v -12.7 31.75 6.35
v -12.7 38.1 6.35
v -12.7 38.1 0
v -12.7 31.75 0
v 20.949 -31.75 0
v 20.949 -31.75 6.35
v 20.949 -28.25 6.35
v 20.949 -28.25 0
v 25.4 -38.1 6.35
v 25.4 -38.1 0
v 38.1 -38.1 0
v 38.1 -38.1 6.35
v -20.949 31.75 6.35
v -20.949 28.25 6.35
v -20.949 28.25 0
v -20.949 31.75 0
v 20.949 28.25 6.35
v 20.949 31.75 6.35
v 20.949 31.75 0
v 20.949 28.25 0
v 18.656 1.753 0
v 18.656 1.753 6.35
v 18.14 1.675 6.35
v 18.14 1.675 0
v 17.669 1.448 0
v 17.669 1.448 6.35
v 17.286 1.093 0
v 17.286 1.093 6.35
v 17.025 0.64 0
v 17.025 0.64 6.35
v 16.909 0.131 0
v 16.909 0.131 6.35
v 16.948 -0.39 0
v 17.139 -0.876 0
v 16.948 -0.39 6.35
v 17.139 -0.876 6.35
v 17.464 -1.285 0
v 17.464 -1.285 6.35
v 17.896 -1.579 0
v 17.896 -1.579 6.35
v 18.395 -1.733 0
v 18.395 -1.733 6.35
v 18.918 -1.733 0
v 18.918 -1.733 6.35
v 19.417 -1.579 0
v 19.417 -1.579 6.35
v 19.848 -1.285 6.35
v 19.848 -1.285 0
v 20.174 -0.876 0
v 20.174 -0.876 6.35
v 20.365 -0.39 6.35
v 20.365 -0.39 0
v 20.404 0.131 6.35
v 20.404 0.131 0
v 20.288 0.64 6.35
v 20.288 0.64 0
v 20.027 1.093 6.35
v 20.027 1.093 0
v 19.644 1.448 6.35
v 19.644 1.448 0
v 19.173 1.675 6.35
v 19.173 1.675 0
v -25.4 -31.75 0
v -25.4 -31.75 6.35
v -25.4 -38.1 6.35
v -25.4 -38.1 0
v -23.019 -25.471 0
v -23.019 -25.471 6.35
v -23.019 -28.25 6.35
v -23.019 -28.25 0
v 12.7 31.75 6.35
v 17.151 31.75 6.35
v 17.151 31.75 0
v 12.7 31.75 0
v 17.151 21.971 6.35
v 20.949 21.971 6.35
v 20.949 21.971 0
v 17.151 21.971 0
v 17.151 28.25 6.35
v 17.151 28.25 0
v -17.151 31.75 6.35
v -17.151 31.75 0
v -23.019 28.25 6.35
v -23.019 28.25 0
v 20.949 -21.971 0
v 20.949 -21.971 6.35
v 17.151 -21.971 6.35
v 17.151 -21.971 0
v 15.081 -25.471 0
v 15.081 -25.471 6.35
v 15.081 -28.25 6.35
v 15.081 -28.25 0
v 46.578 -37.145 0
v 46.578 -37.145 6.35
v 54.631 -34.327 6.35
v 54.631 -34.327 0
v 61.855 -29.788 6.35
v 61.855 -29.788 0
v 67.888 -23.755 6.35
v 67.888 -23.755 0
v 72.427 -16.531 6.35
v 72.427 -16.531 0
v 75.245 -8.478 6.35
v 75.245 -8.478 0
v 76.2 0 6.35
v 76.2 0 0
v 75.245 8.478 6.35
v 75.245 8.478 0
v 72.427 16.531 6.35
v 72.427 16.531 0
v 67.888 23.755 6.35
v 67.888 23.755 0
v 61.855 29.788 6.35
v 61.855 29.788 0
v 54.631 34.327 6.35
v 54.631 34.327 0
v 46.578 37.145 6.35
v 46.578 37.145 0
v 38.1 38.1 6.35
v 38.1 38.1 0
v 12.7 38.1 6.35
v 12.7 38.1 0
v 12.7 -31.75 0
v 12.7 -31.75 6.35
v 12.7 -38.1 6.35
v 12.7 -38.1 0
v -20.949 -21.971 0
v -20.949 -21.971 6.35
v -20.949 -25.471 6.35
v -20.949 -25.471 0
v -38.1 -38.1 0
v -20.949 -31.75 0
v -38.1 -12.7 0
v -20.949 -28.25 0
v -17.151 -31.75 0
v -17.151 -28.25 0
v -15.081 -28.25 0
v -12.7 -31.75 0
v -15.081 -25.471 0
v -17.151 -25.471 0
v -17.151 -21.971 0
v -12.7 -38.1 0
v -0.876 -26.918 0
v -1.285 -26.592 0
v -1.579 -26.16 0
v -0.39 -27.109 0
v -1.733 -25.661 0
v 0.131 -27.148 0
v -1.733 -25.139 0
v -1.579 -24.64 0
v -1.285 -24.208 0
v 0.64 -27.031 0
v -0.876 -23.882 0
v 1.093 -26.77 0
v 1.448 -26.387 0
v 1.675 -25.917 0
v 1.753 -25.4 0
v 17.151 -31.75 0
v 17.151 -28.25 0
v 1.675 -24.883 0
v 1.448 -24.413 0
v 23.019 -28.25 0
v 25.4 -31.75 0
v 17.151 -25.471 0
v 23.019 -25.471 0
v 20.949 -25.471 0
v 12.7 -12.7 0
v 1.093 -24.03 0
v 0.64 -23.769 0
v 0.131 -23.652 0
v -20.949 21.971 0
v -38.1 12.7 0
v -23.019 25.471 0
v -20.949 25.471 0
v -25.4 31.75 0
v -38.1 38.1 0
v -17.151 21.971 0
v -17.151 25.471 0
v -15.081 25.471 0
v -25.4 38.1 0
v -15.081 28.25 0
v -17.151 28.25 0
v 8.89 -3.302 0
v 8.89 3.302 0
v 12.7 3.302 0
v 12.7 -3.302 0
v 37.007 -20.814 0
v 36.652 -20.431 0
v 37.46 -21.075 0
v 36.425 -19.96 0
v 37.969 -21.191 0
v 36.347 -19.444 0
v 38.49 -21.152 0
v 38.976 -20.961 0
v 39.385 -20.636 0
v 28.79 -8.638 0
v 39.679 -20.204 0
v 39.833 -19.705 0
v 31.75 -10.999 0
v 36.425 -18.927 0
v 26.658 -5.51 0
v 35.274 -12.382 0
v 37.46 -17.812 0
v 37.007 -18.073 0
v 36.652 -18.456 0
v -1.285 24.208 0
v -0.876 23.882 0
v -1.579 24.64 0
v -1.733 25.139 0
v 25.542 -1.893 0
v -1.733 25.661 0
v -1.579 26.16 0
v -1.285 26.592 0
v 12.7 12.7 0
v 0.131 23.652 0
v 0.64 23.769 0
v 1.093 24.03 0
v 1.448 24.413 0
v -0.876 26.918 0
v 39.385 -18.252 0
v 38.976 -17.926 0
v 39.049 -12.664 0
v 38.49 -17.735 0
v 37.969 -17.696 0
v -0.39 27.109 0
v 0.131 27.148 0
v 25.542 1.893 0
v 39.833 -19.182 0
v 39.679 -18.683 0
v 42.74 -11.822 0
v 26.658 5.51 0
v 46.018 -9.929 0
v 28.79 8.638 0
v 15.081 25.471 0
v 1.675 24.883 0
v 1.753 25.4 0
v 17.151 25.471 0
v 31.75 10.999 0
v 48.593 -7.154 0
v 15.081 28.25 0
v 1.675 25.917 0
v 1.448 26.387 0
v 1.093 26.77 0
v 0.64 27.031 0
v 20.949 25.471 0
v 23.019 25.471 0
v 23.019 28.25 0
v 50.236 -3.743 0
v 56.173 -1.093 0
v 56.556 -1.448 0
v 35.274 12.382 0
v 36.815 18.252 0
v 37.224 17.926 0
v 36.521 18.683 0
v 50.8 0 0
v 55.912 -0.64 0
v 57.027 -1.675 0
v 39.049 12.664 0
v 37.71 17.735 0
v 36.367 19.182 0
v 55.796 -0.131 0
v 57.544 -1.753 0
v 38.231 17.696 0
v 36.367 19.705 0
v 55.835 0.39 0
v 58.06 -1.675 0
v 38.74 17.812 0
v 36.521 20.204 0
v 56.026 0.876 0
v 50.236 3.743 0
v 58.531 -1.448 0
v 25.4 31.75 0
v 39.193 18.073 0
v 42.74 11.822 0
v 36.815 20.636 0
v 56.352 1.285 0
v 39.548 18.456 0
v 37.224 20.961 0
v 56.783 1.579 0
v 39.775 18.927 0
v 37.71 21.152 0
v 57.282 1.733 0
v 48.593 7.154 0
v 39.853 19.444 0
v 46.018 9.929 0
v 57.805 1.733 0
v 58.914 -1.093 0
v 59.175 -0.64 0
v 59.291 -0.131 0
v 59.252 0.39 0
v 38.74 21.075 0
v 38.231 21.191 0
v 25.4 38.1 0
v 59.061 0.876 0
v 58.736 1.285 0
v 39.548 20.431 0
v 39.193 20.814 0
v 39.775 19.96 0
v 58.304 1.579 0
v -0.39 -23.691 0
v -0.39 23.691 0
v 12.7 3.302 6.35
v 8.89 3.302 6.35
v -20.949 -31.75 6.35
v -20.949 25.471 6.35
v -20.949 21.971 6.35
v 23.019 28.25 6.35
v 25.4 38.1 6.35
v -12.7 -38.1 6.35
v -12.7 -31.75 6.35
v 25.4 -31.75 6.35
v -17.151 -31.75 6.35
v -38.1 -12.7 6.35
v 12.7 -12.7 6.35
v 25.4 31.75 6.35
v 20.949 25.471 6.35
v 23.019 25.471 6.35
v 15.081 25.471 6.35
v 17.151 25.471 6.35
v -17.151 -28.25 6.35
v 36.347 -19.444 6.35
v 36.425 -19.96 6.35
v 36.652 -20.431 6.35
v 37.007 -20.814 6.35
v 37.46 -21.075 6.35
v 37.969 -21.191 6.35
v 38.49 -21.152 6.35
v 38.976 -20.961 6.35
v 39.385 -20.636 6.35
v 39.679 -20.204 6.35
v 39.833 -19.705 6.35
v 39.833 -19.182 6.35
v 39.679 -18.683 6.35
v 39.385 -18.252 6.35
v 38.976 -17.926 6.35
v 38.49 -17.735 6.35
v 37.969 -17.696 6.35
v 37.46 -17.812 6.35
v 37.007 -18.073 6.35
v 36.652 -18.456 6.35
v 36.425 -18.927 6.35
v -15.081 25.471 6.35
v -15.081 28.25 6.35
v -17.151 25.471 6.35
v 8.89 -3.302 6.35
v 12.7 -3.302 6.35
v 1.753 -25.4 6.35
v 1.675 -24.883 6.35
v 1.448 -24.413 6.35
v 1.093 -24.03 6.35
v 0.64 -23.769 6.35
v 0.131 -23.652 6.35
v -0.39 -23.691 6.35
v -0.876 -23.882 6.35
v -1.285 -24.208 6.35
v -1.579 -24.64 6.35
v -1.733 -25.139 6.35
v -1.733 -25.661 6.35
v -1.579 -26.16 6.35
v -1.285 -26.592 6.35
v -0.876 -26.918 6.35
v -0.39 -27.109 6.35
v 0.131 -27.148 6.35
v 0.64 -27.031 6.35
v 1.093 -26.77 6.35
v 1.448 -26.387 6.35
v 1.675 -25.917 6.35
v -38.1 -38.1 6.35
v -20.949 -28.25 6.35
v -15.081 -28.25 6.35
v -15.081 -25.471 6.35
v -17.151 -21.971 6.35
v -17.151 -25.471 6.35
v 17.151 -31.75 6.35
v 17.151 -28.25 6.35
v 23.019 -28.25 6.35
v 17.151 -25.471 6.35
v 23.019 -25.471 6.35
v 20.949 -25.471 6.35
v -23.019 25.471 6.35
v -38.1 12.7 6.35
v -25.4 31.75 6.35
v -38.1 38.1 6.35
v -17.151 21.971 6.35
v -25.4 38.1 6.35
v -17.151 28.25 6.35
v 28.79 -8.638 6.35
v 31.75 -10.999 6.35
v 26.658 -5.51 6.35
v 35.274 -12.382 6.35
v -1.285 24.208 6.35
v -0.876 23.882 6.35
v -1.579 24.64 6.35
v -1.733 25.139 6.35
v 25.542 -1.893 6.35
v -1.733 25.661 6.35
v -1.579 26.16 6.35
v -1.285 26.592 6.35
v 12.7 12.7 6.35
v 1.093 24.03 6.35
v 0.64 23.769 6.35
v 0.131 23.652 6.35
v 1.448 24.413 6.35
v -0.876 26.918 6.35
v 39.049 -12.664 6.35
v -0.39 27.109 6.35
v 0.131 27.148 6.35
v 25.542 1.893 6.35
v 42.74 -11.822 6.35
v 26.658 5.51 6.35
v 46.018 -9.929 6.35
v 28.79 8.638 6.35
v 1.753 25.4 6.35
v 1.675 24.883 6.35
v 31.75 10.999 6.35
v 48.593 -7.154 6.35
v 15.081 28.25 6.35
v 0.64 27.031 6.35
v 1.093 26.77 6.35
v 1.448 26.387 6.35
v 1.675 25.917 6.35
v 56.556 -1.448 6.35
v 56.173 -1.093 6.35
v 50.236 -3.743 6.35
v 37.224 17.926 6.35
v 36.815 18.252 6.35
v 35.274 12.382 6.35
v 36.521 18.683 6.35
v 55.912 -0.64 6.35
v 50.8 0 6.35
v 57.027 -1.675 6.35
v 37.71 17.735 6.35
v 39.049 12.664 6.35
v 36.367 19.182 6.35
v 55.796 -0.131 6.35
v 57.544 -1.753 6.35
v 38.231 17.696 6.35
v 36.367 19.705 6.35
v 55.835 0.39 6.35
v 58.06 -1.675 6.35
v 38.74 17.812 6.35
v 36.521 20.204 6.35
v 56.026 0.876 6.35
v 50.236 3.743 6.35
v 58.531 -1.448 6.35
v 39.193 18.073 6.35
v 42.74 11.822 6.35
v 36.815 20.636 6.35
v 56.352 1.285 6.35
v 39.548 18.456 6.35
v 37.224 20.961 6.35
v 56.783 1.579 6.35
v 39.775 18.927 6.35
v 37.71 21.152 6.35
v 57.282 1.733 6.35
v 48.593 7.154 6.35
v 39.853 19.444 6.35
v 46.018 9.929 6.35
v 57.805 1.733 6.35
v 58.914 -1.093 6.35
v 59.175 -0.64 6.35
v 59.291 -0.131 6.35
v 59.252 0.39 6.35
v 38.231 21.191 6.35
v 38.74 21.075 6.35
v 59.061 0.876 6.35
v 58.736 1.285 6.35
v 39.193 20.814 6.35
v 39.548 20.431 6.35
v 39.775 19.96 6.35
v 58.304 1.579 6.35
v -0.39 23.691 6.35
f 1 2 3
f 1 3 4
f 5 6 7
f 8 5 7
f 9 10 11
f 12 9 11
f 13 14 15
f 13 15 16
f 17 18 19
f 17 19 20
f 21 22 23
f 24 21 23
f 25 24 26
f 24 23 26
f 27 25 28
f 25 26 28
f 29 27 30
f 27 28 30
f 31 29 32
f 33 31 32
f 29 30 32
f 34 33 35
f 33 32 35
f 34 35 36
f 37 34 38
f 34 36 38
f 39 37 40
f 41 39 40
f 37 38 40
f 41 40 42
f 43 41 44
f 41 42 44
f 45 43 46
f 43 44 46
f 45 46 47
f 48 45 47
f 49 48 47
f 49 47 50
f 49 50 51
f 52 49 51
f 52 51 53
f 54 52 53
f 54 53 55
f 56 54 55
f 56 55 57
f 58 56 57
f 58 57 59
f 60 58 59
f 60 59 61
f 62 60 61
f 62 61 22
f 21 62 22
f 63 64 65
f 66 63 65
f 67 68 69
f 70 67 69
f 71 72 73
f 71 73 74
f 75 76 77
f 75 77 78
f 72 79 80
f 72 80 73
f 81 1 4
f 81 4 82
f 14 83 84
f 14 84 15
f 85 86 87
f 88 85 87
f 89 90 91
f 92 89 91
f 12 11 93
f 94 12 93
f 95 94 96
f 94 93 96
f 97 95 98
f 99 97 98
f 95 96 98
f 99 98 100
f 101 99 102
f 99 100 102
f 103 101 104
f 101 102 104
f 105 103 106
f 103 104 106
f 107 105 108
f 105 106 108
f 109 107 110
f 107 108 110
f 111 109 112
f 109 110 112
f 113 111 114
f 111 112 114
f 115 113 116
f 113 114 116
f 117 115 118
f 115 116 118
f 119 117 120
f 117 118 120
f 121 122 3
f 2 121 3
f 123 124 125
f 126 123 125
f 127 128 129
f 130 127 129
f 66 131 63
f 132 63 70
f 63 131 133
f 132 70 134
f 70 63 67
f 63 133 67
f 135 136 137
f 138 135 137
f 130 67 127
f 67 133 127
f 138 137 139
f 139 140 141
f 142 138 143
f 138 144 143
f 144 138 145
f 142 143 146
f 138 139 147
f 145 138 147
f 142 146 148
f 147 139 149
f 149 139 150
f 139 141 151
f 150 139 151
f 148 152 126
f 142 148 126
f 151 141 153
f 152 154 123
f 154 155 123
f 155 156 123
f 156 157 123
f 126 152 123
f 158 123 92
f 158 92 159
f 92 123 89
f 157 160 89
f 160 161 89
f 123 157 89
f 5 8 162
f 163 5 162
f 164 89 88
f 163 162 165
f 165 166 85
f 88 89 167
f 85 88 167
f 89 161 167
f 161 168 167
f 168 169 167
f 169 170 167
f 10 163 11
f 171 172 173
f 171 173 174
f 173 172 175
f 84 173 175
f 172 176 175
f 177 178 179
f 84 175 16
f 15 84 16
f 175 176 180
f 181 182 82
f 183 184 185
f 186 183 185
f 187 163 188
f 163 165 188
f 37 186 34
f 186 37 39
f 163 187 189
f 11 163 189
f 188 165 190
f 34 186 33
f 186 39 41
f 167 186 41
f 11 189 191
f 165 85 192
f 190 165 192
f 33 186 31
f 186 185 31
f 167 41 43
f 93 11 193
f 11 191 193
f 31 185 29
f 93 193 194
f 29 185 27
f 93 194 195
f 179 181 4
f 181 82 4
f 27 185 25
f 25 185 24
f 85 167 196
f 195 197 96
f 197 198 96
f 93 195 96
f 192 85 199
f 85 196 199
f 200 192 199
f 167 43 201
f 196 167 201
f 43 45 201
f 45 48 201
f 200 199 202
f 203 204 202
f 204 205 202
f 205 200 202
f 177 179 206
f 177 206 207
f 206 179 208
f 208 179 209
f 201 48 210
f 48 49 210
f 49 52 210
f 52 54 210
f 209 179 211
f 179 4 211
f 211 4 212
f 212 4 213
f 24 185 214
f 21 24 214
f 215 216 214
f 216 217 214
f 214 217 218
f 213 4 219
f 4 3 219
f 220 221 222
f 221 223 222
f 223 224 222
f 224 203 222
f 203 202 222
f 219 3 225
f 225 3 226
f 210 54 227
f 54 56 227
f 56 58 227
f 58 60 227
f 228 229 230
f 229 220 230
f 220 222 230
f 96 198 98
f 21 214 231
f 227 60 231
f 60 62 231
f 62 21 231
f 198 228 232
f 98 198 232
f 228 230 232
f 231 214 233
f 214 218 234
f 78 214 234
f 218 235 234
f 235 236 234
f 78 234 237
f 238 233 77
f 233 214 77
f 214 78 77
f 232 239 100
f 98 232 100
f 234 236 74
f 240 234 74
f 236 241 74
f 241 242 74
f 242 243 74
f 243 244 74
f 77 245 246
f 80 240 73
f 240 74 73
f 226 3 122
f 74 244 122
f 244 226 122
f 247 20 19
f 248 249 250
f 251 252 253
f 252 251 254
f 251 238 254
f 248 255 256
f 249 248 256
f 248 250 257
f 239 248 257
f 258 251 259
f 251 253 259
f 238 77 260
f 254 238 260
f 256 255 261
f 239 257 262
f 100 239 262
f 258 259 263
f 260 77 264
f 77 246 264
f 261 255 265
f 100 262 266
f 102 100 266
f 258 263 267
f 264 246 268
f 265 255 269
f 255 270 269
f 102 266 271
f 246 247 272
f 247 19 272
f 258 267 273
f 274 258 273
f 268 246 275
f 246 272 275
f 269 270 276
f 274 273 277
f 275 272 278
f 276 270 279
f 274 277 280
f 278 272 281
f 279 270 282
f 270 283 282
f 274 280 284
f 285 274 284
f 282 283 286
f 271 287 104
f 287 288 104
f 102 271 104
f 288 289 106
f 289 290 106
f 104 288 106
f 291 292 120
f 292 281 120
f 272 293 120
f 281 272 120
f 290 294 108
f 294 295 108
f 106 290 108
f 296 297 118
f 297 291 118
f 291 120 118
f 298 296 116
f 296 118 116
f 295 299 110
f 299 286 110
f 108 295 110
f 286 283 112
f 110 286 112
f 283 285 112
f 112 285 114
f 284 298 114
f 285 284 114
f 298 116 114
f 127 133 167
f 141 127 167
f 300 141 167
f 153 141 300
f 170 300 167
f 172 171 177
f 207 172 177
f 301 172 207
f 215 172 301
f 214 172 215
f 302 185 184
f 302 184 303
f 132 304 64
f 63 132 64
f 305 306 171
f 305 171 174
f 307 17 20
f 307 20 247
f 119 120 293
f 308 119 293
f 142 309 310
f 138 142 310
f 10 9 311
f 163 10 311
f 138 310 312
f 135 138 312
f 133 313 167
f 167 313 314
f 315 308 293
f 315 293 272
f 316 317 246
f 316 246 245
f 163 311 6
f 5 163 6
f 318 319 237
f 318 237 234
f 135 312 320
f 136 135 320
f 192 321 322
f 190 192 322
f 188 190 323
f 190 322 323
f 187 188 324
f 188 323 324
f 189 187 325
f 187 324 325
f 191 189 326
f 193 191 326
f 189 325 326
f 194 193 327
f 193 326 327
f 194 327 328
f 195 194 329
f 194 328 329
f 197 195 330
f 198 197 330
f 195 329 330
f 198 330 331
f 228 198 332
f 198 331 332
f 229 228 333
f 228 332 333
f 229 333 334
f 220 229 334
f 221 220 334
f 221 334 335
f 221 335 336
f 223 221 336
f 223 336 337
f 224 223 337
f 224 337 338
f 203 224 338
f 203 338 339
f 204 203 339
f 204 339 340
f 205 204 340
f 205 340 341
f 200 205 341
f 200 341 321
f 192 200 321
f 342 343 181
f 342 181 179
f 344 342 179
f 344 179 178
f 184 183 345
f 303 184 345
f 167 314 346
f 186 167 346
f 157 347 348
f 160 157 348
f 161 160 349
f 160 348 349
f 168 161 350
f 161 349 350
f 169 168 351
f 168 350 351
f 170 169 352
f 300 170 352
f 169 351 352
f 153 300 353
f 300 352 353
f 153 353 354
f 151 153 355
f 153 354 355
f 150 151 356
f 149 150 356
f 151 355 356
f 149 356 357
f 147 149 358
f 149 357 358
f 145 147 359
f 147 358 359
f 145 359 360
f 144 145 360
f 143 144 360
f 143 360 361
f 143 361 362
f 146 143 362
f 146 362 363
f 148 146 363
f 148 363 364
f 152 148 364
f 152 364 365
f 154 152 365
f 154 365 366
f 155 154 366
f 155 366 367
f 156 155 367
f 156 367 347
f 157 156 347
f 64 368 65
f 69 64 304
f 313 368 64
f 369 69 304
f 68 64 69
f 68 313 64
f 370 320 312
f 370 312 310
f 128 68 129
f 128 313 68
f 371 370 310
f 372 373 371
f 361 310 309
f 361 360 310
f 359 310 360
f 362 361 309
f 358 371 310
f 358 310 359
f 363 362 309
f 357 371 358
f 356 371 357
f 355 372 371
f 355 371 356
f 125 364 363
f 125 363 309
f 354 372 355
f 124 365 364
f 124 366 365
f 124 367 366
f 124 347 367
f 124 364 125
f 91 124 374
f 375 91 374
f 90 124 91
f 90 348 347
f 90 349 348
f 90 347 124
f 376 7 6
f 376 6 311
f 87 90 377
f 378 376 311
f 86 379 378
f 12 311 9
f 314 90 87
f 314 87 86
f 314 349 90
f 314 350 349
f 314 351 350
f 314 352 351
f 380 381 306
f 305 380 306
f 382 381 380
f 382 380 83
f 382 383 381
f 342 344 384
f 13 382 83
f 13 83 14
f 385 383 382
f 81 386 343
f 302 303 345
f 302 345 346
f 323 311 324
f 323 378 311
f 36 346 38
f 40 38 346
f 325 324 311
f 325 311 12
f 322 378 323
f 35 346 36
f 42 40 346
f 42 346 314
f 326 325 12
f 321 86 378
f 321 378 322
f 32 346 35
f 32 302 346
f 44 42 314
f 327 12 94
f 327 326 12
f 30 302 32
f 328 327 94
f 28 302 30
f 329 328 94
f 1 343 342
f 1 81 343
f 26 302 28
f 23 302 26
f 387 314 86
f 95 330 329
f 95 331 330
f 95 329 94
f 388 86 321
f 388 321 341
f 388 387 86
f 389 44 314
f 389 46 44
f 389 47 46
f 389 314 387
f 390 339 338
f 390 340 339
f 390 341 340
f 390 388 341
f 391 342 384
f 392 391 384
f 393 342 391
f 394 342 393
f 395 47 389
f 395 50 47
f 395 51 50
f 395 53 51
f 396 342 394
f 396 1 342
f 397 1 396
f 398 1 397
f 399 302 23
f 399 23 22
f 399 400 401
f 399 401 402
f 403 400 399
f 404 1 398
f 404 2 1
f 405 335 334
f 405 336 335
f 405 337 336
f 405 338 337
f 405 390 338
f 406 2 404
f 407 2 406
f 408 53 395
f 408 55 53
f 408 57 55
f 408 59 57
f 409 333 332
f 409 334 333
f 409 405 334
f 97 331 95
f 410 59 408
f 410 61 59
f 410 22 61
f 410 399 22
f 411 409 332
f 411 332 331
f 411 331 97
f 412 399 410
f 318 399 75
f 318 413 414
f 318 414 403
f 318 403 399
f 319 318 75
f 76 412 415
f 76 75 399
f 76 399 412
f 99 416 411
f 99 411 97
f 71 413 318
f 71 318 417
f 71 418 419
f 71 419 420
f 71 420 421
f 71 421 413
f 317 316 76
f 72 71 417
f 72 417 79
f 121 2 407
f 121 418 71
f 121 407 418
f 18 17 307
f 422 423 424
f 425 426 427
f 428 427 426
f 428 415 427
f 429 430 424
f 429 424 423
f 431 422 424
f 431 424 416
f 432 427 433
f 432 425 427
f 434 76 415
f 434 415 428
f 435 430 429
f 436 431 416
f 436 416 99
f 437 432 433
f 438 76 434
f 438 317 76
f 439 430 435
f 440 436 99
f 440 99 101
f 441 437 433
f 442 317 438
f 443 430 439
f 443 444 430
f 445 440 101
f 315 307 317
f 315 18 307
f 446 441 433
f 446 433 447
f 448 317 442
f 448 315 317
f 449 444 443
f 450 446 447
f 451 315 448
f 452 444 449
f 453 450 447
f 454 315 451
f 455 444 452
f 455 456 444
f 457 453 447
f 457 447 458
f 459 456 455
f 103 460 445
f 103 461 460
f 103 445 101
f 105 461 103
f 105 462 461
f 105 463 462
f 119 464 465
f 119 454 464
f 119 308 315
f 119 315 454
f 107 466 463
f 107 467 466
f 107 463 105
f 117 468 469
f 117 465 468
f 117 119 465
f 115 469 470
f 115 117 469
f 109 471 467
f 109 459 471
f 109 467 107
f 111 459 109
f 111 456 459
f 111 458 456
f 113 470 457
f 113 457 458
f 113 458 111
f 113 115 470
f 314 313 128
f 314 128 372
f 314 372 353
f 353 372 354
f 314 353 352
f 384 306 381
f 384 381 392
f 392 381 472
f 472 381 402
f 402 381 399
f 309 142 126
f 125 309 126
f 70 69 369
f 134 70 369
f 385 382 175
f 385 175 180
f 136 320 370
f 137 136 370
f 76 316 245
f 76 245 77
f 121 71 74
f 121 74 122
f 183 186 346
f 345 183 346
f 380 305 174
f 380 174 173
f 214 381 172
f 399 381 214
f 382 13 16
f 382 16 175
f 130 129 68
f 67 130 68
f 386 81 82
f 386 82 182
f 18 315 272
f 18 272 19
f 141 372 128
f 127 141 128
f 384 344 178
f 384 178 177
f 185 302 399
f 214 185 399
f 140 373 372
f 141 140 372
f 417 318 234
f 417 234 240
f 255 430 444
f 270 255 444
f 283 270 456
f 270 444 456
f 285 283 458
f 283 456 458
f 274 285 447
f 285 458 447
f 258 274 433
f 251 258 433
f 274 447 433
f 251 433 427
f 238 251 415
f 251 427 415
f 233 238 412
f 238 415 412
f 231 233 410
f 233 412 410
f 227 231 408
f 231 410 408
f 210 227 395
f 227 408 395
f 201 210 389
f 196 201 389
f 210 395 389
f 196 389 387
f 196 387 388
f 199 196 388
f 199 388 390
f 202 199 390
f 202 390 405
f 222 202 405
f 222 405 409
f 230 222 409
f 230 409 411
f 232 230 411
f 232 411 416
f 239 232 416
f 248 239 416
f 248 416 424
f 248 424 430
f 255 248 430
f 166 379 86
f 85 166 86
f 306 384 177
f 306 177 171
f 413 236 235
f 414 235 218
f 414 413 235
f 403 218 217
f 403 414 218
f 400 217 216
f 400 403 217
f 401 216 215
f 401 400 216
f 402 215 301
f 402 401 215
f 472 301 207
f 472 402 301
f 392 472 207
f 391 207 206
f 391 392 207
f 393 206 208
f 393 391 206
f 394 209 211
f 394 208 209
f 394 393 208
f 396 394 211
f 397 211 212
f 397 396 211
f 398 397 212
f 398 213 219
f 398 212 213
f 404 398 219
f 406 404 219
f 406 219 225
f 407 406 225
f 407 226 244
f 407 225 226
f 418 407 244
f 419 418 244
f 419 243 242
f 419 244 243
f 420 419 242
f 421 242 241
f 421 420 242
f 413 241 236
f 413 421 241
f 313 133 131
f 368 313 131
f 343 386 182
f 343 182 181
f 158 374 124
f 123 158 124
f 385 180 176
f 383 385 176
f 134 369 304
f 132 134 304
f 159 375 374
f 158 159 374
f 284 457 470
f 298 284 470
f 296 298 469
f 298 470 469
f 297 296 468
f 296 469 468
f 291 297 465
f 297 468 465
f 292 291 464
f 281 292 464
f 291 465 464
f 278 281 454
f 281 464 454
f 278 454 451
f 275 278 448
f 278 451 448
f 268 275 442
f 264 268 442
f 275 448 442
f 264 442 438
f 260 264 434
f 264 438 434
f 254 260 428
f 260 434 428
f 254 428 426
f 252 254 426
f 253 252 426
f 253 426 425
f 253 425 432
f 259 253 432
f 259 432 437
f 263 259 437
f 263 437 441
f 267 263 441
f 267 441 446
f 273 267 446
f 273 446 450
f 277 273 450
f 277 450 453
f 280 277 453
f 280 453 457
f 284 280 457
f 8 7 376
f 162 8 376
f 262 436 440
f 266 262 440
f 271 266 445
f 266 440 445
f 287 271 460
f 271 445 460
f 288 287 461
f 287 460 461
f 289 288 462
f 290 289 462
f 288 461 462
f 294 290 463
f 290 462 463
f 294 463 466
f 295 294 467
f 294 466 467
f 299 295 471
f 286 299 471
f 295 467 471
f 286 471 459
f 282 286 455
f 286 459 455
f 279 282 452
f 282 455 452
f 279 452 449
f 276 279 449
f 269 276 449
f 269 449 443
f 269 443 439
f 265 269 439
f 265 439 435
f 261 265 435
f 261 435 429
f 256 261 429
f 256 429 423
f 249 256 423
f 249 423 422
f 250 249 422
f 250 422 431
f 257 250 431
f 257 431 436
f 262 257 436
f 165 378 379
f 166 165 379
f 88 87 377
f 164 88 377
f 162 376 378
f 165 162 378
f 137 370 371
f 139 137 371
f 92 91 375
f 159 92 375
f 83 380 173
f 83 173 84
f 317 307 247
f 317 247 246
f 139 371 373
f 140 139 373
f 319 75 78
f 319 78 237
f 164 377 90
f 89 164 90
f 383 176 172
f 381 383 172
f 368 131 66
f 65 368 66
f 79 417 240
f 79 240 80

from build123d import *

# Parameters (mm, degrees)
BOSS_EXTRUDE1_DEPTH  = 6.35
SKETCH2_W            = 50.8
SKETCH2_H            = 25.4
CUT_EXTRUDE1_DEPTH   = 86.430512699
CUT_EXTRUDE2_DEPTH   = 6.35
LPATTERN1_COUNT      = 2
LPATTERN1_PITCH      = 38.1
SKETCH4_R            = 1.7526
CUT_EXTRUDE5_DEPTH   = 86.430512699
SKETCH6_W            = 6.35
SKETCH6_H            = 6.604
BOSS_EXTRUDE2_DEPTH  = 3.81
MIRROR4_COPY_1_DEPTH = 6.35
SKETCH5_R            = 12.7
CUT_EXTRUDE4_DEPTH   = 86.430512699
SKETCH7_R            = 1.7526
CUT_EXTRUDE6_DEPTH   = 86.430512699
CIRPATTERN1_COUNT    = 4


with BuildPart() as part:
    # Sketch1 → Boss-Extrude1 (new body)
    with BuildSketch(Plane.XY):
        with BuildLine():
            Line((-38.1, -38.1), (38.1, -38.1))
            ThreePointArc((38.1, -38.1), (76.2, 0), (38.1, 38.1))
            Line((38.1, 38.1), (-38.1, 38.1))
            Line((-38.1, 38.1), (-38.1, -38.1))
        make_face()
    extrude(amount=BOSS_EXTRUDE1_DEPTH)

    # Sketch2 → Cut-Extrude1 (cut, through all)
    with BuildSketch(Plane.XY.offset(6.35)):
        with Locations((-12.7, 0)):
            Rectangle(SKETCH2_W, SKETCH2_H)
    extrude(amount=-CUT_EXTRUDE1_DEPTH, mode=Mode.SUBTRACT)

    # Sketch3 → Cut-Extrude2 (cut)
    with BuildSketch(Plane.XY.offset(6.35)):
        Polygon((-25.4, -38.1), (-12.7, -38.1), (-12.7, -31.75), (-17.15135, -31.75), (-17.15135, -28.2495625), (-15.08125, -28.2495625), (-15.08125, -25.4714375), (-17.15135, -25.4714375), (-17.15135, -21.971), (-20.94865, -21.971), (-20.94865, -25.4714375), (-23.01875, -25.4714375), (-23.01875, -28.2495625), (-20.94865, -28.2495625), (-20.94865, -31.75), (-25.4, -31.75), align=None)
    cut_extrude2 = extrude(amount=-CUT_EXTRUDE2_DEPTH, mode=Mode.SUBTRACT)

    # LPattern1: Cut-Extrude2 ×2
    with Locations(*[(i * LPATTERN1_PITCH, 0, 0) for i in range(1, LPATTERN1_COUNT)]):
        add(cut_extrude2, mode=Mode.SUBTRACT)

    # Sketch4 → Cut-Extrude5 (cut, through all)
    with BuildSketch(Plane.XY.offset(6.35)):
        with Locations((0, -25.4)):
            Circle(SKETCH4_R)
    cut_extrude5 = extrude(amount=-CUT_EXTRUDE5_DEPTH, mode=Mode.SUBTRACT)

    # Sketch6 → Boss-Extrude2 (add)
    with BuildSketch(Plane.ZY.offset(-12.7)):
        with Locations((3.175, 0)):
            Rectangle(SKETCH6_W, SKETCH6_H)
    extrude(amount=BOSS_EXTRUDE2_DEPTH)

    # Mirror3: Cut-Extrude5 across plane
    add(cut_extrude5.mirror(Plane.ZX), mode=Mode.SUBTRACT)

    # Mirror4: Cut-Extrude2 across plane
    add(cut_extrude2.mirror(Plane.ZX), mode=Mode.SUBTRACT)

    # Mirror4 copy 1 sketch → Mirror4 copy 1 (cut)
    with BuildSketch(Plane(origin=(38.1, 0, 6.35), x_dir=(1, 0, 0), z_dir=(0, 0, 1))):
        Polygon((-25.4, 38.1), (-12.7, 38.1), (-12.7, 31.75), (-17.15135, 31.75), (-17.15135, 28.2495625), (-15.08125, 28.2495625), (-15.08125, 25.4714375), (-17.15135, 25.4714375), (-17.15135, 21.971), (-20.94865, 21.971), (-20.94865, 25.4714375), (-23.01875, 25.4714375), (-23.01875, 28.2495625), (-20.94865, 28.2495625), (-20.94865, 31.75), (-25.4, 31.75), align=None)
    extrude(amount=-MIRROR4_COPY_1_DEPTH, mode=Mode.SUBTRACT)

    # Sketch5 → Cut-Extrude4 (cut, through all)
    with BuildSketch(Plane.XY.offset(6.35)):
        with Locations((38.1, 0)):
            Circle(SKETCH5_R)
    extrude(amount=-CUT_EXTRUDE4_DEPTH, mode=Mode.SUBTRACT)

    # Sketch7 → Cut-Extrude6 (cut, through all)
    with BuildSketch(Plane.XY.offset(6.35)):
        with Locations((38.1, 19.4437)):
            Circle(SKETCH7_R)
    cut_extrude6 = extrude(amount=-CUT_EXTRUDE6_DEPTH, mode=Mode.SUBTRACT)

    # CirPattern1: Cut-Extrude6 ×4 about axis
    cirpattern1_axis = Axis((38.1, 0, 0), (0, 0, 1))
    for i in range(1, CIRPATTERN1_COUNT):
        add(cut_extrude6.rotate(cirpattern1_axis, i * 360 / CIRPATTERN1_COUNT), mode=Mode.SUBTRACT)


solid = part.part
